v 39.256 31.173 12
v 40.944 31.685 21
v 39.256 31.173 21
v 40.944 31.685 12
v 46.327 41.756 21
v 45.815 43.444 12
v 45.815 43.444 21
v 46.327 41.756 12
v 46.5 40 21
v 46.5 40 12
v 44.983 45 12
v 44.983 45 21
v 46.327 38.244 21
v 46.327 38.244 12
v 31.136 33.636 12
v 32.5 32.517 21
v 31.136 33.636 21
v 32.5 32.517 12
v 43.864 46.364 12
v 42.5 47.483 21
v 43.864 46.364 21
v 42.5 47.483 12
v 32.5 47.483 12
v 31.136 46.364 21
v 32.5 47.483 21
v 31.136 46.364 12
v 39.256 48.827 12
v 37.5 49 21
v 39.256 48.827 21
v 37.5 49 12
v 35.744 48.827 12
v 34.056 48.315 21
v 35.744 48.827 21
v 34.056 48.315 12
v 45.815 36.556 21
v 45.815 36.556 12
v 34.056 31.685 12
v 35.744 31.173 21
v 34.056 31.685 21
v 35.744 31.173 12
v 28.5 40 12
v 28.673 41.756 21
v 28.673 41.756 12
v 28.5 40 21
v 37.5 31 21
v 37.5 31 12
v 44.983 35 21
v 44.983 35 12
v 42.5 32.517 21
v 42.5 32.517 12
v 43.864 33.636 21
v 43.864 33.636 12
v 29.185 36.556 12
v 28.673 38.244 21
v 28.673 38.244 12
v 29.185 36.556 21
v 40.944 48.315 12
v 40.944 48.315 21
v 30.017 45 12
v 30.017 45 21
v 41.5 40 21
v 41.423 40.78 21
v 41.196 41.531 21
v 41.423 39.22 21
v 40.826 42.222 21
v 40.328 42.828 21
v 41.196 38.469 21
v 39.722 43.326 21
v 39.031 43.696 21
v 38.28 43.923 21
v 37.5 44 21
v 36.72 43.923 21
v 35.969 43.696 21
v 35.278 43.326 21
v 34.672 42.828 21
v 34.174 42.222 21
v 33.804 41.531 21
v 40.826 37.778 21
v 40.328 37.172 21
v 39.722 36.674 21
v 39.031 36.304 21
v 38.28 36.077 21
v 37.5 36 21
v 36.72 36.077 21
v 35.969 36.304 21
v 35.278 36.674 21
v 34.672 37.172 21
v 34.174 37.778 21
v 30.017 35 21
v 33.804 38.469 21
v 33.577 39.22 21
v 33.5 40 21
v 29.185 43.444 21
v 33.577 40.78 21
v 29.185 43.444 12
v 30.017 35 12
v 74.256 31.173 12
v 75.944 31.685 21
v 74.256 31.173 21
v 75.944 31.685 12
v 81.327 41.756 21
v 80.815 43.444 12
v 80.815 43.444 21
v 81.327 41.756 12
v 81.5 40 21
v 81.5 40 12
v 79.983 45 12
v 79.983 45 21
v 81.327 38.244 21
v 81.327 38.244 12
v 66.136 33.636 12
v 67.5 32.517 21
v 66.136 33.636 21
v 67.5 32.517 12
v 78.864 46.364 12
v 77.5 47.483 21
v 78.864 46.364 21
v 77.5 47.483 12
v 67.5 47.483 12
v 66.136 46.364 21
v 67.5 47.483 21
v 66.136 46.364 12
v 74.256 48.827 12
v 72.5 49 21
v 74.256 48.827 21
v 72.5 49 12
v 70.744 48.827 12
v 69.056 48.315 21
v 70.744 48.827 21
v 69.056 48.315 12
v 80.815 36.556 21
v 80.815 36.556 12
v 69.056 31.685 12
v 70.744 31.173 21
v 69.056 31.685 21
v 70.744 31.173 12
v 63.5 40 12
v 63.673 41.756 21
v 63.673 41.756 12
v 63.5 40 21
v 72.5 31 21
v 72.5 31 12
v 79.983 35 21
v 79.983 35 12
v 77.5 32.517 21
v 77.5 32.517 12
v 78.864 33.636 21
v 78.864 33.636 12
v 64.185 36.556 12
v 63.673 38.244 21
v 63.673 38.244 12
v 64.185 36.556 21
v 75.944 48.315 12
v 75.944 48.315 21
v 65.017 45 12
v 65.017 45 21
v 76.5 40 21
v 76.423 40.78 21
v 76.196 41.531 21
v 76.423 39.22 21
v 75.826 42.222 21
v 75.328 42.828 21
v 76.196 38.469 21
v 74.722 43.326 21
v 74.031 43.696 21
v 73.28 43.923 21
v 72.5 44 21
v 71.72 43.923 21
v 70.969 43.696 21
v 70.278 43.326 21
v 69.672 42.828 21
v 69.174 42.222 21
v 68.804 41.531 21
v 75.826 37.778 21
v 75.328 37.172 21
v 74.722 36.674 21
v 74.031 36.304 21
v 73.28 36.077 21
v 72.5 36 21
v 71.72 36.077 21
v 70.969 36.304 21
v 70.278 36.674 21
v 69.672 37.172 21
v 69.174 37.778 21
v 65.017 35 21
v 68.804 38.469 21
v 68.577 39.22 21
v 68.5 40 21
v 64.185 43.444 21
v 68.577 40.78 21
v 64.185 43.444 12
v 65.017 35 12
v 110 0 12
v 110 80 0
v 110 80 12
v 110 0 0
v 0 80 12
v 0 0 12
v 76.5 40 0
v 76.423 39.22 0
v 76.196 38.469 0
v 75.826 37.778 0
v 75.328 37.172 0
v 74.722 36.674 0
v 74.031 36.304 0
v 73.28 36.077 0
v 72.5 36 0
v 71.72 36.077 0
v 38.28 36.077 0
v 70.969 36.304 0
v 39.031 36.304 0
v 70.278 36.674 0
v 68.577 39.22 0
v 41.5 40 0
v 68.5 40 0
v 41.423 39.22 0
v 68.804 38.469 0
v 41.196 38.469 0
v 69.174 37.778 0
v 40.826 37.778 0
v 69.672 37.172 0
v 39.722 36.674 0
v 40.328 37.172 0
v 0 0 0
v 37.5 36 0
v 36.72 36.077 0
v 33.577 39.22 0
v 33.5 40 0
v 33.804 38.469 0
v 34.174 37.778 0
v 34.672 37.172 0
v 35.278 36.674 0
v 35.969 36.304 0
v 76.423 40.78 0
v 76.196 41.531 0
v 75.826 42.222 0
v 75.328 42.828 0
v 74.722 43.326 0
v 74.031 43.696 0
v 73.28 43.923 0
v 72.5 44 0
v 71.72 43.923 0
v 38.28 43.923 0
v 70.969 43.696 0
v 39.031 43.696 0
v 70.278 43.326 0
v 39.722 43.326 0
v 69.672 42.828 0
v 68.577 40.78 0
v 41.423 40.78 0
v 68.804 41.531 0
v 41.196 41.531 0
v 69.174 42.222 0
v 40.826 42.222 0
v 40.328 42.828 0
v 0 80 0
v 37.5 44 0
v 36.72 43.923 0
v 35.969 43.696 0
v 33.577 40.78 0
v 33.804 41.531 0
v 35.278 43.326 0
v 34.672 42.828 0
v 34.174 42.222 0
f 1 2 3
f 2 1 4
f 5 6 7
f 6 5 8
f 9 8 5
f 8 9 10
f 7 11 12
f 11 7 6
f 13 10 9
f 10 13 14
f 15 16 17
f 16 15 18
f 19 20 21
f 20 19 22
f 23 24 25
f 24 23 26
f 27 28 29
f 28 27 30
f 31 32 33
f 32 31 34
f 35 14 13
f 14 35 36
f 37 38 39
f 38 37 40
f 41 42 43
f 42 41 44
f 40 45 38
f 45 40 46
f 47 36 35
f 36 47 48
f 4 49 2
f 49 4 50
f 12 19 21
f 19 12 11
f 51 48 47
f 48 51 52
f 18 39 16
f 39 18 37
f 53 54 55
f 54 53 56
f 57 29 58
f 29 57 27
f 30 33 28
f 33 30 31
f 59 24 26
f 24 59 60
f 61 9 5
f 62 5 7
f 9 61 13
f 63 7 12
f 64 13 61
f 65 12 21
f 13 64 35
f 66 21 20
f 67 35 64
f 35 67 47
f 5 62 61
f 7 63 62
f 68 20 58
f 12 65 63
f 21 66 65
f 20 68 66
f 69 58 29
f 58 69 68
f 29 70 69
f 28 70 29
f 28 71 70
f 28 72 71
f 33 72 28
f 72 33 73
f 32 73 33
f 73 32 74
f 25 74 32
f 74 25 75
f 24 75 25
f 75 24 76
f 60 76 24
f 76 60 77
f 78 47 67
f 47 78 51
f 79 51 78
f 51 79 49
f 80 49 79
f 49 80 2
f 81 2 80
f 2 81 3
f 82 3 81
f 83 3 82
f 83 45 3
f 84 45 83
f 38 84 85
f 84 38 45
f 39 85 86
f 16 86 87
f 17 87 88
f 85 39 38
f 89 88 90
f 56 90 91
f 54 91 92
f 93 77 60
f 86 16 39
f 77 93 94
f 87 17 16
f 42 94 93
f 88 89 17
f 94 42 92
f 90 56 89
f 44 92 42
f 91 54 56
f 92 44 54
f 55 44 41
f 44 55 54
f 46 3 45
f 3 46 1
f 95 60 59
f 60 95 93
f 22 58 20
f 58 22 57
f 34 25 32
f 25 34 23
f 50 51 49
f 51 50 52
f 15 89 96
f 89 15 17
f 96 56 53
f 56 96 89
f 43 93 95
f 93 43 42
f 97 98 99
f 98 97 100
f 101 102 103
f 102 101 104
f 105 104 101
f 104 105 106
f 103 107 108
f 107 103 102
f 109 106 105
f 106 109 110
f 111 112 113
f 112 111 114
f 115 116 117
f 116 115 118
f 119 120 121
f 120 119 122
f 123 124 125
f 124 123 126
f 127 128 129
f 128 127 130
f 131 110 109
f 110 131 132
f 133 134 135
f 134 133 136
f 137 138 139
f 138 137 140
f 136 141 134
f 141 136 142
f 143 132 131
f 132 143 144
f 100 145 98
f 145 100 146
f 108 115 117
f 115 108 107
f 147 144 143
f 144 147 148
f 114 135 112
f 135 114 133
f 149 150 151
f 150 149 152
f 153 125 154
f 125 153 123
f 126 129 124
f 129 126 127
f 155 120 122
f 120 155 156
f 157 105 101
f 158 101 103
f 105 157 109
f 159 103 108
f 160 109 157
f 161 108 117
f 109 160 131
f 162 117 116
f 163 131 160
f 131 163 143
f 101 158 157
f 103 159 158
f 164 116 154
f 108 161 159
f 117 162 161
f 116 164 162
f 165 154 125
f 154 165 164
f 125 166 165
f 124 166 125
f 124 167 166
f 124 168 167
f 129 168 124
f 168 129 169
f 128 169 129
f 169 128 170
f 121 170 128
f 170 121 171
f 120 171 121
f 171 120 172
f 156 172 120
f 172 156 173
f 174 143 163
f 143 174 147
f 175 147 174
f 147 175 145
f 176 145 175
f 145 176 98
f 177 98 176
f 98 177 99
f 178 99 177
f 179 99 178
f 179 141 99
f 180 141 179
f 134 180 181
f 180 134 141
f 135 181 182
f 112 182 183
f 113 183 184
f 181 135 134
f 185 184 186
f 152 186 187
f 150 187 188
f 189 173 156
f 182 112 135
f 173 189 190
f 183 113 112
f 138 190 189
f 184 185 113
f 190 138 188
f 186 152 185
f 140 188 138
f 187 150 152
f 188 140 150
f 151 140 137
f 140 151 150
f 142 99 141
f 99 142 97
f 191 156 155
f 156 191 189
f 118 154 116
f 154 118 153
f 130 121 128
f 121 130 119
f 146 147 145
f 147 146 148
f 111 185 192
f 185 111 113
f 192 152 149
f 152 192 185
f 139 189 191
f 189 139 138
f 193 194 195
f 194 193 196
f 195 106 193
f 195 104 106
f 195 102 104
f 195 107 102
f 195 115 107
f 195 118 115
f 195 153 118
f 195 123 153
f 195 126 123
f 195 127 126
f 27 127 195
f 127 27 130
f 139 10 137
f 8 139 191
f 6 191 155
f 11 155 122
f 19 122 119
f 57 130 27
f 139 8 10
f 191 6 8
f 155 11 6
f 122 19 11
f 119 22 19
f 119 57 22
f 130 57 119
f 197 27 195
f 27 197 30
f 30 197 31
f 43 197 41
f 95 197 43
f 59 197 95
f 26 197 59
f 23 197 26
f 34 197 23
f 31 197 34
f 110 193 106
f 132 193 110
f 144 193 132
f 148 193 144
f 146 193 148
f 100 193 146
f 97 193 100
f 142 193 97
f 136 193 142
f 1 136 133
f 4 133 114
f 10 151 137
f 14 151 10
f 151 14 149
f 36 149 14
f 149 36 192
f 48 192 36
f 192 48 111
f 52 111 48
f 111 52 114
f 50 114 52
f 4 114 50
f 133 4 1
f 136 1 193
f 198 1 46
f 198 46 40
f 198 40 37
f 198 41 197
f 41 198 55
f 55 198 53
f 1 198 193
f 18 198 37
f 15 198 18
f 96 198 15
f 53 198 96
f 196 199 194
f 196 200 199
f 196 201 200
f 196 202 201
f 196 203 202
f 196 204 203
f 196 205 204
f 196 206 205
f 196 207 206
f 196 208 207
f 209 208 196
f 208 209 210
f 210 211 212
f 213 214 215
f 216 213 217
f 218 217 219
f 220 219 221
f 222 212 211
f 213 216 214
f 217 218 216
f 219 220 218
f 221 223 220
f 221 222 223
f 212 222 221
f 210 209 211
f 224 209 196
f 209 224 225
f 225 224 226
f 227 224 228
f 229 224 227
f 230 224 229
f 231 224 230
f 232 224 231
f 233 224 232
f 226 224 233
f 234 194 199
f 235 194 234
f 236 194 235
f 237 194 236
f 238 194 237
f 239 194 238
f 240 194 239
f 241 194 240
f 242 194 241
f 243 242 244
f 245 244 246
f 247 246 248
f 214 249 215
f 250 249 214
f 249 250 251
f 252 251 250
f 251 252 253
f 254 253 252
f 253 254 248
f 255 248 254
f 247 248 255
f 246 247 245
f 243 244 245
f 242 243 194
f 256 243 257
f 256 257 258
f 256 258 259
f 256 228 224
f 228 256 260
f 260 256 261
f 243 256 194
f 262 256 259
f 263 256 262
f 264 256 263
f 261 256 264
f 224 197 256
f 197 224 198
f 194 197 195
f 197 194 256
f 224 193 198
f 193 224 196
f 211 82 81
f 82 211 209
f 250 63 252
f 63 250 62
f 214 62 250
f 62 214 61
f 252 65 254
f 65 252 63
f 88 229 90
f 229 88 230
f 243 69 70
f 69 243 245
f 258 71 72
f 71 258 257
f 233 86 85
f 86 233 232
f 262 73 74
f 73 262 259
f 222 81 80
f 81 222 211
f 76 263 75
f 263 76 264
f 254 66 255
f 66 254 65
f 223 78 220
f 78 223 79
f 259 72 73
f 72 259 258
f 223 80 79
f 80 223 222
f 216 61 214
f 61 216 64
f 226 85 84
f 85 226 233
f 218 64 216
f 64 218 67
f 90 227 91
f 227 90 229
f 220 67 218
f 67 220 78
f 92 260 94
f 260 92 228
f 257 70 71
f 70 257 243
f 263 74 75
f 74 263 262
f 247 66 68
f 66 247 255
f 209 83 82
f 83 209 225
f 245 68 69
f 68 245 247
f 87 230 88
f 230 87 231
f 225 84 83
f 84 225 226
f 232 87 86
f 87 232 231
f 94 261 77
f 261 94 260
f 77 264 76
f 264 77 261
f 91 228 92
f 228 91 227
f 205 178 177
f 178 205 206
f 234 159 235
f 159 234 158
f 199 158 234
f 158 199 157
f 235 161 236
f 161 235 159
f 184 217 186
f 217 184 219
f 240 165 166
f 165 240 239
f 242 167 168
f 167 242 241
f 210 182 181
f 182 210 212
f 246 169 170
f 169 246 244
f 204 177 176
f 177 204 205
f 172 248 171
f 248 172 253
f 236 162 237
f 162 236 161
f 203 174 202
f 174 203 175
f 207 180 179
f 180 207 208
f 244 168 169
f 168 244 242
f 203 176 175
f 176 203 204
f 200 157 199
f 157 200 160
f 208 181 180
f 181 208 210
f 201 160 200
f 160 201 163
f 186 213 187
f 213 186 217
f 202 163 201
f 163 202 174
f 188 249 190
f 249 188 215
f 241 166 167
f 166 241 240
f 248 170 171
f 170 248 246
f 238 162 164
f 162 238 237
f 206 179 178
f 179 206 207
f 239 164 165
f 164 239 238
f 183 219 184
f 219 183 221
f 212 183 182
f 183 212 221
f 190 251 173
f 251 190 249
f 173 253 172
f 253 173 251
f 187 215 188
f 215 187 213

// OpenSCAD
$fn = 32;

// ----------------------------------------------------------------------
// Drill jig: two_boss jig
// ----------------------------------------------------------------------

// --- parameters (mm) ---
plate_l = 110;            // plate length, X
plate_w = 80;             // plate width, Y
plate_t = 12;             // plate thickness
boss_d = 18;              // guide boss diameter
boss_h = 10;              // boss height above the plate
guide_d = 8;              // guide hole diameter
boss_pitch = 35;          // boss pitch

n_boss = 2;  // guide bosses
boss_x0 = (plate_l - (n_boss - 1) * boss_pitch) / 2;  // first boss X
boss_top = plate_t - 1 + boss_h;  // boss crown height
total_h = boss_top;  // overall height

difference() {
  union() {
  cube([plate_l, plate_w, plate_t]);
  for (i = [0 : n_boss - 1])
    translate([boss_x0 + i * boss_pitch, plate_w / 2, plate_t - 1])
      cylinder(h = boss_h, d = boss_d);
  }
  for (i = [0 : n_boss - 1])
    translate([boss_x0 + i * boss_pitch, plate_w / 2, -1])
      cylinder(h = plate_t + boss_h, d = guide_d);
}
